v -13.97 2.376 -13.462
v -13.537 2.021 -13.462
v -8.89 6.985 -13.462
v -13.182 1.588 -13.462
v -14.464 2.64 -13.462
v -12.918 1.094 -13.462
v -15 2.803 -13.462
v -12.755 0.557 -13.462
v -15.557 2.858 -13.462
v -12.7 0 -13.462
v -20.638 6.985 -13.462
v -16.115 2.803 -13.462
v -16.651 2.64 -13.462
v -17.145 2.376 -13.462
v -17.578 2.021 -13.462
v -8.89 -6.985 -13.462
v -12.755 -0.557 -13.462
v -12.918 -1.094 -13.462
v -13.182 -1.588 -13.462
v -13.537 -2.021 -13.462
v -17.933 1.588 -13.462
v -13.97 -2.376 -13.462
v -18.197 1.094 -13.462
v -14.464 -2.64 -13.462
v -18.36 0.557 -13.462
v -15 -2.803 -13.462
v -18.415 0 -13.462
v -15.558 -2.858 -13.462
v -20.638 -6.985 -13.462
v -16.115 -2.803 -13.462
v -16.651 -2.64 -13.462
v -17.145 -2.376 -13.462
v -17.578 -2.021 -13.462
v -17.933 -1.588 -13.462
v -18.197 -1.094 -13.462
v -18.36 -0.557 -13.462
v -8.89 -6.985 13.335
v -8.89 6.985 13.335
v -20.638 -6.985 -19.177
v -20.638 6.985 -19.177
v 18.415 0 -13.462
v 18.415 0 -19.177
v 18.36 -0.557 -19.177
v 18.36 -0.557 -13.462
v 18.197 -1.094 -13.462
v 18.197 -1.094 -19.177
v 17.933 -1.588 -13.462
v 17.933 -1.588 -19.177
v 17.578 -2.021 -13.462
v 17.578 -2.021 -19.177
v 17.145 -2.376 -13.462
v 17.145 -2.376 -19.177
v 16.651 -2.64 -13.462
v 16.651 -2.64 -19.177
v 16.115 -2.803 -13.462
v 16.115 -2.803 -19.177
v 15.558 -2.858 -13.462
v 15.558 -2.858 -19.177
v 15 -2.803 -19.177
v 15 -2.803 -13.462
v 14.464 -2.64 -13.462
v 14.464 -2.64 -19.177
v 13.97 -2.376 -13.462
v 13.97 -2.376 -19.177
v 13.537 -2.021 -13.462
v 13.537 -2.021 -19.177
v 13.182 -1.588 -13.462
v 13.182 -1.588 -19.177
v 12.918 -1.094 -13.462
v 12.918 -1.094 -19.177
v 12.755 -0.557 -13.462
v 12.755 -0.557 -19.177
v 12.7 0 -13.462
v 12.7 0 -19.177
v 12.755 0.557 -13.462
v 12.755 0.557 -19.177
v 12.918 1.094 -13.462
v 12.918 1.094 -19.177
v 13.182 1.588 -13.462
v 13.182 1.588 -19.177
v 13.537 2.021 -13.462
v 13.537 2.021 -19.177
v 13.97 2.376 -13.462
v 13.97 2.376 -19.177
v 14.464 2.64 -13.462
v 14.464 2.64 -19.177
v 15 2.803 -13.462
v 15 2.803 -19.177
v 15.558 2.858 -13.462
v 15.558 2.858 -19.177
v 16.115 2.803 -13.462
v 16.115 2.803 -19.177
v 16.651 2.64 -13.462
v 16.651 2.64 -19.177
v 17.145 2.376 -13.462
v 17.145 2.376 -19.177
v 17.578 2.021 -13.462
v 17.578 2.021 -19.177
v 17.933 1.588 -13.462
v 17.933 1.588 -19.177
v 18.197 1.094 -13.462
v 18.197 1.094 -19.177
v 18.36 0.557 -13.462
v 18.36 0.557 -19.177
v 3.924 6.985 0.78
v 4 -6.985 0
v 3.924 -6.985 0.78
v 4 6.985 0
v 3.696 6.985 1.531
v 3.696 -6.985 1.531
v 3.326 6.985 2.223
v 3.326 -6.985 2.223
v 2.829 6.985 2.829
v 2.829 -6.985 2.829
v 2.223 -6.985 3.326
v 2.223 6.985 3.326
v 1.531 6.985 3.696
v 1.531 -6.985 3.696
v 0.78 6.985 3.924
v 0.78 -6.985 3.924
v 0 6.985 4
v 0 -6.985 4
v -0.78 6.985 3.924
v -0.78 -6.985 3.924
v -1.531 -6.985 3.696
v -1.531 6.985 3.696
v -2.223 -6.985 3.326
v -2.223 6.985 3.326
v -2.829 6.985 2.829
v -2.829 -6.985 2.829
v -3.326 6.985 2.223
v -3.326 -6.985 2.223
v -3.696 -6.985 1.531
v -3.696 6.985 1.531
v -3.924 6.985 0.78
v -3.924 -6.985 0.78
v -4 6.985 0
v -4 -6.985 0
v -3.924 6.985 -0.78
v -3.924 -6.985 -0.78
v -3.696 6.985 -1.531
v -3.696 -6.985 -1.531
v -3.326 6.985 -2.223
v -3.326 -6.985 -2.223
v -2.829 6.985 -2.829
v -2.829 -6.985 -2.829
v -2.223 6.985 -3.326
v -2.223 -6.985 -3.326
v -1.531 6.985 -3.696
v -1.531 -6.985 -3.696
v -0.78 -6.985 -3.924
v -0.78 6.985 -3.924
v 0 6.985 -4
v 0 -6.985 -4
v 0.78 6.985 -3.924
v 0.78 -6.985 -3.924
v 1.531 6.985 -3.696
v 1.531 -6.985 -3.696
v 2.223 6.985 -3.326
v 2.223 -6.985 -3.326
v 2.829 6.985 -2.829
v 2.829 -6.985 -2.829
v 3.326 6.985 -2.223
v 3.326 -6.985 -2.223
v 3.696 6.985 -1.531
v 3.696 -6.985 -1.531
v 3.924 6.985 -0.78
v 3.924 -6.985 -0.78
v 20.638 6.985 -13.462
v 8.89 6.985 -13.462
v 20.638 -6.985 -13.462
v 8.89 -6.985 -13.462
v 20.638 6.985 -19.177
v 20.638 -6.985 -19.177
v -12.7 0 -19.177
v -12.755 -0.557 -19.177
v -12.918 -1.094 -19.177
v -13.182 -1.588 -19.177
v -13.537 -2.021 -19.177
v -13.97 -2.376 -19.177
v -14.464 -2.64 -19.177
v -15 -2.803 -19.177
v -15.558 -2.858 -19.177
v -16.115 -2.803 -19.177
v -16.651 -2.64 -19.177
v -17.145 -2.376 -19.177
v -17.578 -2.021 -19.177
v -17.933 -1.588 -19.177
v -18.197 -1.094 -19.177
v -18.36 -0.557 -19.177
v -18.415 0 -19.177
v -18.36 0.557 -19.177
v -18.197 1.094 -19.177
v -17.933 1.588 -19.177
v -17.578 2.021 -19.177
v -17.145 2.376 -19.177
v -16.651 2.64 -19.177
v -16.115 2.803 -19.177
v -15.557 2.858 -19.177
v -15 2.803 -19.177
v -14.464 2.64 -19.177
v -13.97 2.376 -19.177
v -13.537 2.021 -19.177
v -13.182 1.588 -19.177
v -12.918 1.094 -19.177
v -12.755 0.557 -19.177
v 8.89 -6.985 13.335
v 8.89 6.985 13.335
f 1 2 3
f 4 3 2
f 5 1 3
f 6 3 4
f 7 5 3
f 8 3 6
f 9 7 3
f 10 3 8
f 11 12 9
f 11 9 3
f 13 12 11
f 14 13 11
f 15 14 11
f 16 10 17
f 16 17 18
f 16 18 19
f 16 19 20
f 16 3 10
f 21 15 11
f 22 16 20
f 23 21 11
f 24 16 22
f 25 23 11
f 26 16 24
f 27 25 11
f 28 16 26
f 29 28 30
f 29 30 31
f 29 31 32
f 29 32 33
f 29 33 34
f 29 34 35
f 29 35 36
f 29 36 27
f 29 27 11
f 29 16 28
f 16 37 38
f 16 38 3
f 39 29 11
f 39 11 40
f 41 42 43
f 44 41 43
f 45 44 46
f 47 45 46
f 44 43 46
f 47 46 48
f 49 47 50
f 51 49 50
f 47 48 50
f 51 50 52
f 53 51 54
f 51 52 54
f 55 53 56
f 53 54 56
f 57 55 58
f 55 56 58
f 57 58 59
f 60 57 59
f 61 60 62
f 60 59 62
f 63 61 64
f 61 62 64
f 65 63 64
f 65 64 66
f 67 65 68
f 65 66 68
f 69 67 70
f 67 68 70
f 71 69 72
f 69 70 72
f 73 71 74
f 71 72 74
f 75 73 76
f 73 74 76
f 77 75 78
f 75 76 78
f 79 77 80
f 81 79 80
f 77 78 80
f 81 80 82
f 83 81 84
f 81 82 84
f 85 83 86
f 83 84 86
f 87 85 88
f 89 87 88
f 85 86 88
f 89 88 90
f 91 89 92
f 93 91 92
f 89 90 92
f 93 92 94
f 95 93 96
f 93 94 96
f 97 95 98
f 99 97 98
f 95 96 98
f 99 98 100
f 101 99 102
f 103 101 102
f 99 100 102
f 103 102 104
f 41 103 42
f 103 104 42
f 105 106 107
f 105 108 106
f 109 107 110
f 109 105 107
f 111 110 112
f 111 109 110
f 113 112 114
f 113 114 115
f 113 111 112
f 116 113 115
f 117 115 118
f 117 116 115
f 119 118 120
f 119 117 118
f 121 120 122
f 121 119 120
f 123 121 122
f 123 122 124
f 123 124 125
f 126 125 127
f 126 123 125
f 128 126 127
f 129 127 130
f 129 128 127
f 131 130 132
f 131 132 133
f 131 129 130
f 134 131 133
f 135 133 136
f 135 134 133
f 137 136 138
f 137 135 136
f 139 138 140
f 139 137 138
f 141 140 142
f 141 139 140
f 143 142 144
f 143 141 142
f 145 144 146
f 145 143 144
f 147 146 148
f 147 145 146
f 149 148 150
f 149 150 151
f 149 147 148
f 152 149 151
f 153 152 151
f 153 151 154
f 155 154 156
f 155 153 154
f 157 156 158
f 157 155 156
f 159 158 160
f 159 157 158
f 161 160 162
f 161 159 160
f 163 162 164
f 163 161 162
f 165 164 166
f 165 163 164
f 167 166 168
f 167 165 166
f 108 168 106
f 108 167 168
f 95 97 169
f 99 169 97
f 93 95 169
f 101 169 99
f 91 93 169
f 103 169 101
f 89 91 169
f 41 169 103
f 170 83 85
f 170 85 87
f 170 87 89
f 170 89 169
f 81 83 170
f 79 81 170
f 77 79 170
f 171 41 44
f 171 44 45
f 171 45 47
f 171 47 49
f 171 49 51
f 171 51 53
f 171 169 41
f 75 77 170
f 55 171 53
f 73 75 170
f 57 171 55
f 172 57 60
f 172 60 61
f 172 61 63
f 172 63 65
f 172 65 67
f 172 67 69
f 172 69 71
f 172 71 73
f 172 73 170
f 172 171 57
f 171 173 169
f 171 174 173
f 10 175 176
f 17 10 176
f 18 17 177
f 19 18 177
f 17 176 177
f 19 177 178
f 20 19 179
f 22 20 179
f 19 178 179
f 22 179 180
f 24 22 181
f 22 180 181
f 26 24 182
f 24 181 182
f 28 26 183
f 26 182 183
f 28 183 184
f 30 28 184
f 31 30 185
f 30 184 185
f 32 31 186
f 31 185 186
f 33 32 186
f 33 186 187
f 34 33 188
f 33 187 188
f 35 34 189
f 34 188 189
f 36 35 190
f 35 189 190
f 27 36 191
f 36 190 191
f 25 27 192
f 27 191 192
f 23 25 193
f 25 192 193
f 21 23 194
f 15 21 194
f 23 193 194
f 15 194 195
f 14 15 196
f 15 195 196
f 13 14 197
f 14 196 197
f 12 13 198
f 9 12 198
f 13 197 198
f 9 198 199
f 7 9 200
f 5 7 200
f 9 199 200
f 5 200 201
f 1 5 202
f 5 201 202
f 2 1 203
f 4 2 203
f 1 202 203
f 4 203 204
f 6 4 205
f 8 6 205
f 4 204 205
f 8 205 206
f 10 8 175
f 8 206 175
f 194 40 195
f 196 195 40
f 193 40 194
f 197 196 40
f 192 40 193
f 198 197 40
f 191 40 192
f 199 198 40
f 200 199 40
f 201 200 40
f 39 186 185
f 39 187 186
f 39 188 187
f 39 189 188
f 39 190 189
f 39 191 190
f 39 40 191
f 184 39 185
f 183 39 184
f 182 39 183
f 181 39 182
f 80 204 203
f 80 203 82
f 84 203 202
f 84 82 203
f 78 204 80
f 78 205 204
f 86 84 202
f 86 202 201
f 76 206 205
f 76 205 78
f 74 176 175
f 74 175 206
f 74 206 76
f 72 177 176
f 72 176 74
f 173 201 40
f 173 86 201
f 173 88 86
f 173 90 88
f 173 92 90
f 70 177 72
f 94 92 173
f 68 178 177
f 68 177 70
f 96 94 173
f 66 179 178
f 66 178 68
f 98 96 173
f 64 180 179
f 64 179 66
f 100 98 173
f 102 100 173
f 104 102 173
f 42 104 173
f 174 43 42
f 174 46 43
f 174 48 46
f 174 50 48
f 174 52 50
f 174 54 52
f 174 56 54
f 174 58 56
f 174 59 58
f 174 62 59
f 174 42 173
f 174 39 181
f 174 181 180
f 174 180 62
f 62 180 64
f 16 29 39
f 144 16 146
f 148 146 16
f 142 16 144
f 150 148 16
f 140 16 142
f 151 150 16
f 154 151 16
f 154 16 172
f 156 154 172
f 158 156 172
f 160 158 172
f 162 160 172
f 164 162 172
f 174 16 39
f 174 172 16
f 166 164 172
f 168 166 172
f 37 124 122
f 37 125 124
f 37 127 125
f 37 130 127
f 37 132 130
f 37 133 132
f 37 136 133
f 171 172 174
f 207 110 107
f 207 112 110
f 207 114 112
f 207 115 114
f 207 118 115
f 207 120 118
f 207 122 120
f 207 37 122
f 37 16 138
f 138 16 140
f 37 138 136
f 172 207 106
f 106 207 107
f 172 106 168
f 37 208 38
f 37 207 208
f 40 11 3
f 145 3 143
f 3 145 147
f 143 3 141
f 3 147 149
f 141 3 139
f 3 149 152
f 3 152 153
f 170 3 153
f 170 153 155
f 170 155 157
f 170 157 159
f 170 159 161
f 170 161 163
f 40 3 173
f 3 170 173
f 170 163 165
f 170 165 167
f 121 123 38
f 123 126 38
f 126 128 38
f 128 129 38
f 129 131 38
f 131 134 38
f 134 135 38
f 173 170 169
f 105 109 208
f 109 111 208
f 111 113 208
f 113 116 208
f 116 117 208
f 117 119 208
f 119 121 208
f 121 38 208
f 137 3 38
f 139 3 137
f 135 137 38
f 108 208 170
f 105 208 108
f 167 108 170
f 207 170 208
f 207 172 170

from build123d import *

# Parameters (mm, degrees)
F0_R     = 4.0005
F1_DEPTH = 6.985
F2_R     = 2.8575
F3_DEPTH = 5.715


with BuildPart() as f1:
    # F0 (on Front) → F1 (new body, symmetric)
    with BuildSketch(Plane.XZ):
        Polygon((8.89, 13.335), (-8.89, 13.335), (-8.89, -13.462), (-20.6375, -13.462), (-20.6375, -19.177), (20.6375, -19.177), (20.6375, -13.462), (8.89, -13.462), align=None)
        Circle(F0_R, mode=Mode.SUBTRACT)
    extrude(amount=F1_DEPTH, both=True)

    # F2 (on face) → F3 (cut, through all)
    with BuildSketch(Plane(origin=(0, 0, -19.177), x_dir=(1, 0, 0), z_dir=(0, 0, -1))):
        with Locations((-15.5575, 0)):
            Circle(F2_R)
        with Locations((15.5575, 0)):
            Circle(F2_R)
    extrude(amount=-F3_DEPTH, mode=Mode.SUBTRACT)


solid = f1.part
